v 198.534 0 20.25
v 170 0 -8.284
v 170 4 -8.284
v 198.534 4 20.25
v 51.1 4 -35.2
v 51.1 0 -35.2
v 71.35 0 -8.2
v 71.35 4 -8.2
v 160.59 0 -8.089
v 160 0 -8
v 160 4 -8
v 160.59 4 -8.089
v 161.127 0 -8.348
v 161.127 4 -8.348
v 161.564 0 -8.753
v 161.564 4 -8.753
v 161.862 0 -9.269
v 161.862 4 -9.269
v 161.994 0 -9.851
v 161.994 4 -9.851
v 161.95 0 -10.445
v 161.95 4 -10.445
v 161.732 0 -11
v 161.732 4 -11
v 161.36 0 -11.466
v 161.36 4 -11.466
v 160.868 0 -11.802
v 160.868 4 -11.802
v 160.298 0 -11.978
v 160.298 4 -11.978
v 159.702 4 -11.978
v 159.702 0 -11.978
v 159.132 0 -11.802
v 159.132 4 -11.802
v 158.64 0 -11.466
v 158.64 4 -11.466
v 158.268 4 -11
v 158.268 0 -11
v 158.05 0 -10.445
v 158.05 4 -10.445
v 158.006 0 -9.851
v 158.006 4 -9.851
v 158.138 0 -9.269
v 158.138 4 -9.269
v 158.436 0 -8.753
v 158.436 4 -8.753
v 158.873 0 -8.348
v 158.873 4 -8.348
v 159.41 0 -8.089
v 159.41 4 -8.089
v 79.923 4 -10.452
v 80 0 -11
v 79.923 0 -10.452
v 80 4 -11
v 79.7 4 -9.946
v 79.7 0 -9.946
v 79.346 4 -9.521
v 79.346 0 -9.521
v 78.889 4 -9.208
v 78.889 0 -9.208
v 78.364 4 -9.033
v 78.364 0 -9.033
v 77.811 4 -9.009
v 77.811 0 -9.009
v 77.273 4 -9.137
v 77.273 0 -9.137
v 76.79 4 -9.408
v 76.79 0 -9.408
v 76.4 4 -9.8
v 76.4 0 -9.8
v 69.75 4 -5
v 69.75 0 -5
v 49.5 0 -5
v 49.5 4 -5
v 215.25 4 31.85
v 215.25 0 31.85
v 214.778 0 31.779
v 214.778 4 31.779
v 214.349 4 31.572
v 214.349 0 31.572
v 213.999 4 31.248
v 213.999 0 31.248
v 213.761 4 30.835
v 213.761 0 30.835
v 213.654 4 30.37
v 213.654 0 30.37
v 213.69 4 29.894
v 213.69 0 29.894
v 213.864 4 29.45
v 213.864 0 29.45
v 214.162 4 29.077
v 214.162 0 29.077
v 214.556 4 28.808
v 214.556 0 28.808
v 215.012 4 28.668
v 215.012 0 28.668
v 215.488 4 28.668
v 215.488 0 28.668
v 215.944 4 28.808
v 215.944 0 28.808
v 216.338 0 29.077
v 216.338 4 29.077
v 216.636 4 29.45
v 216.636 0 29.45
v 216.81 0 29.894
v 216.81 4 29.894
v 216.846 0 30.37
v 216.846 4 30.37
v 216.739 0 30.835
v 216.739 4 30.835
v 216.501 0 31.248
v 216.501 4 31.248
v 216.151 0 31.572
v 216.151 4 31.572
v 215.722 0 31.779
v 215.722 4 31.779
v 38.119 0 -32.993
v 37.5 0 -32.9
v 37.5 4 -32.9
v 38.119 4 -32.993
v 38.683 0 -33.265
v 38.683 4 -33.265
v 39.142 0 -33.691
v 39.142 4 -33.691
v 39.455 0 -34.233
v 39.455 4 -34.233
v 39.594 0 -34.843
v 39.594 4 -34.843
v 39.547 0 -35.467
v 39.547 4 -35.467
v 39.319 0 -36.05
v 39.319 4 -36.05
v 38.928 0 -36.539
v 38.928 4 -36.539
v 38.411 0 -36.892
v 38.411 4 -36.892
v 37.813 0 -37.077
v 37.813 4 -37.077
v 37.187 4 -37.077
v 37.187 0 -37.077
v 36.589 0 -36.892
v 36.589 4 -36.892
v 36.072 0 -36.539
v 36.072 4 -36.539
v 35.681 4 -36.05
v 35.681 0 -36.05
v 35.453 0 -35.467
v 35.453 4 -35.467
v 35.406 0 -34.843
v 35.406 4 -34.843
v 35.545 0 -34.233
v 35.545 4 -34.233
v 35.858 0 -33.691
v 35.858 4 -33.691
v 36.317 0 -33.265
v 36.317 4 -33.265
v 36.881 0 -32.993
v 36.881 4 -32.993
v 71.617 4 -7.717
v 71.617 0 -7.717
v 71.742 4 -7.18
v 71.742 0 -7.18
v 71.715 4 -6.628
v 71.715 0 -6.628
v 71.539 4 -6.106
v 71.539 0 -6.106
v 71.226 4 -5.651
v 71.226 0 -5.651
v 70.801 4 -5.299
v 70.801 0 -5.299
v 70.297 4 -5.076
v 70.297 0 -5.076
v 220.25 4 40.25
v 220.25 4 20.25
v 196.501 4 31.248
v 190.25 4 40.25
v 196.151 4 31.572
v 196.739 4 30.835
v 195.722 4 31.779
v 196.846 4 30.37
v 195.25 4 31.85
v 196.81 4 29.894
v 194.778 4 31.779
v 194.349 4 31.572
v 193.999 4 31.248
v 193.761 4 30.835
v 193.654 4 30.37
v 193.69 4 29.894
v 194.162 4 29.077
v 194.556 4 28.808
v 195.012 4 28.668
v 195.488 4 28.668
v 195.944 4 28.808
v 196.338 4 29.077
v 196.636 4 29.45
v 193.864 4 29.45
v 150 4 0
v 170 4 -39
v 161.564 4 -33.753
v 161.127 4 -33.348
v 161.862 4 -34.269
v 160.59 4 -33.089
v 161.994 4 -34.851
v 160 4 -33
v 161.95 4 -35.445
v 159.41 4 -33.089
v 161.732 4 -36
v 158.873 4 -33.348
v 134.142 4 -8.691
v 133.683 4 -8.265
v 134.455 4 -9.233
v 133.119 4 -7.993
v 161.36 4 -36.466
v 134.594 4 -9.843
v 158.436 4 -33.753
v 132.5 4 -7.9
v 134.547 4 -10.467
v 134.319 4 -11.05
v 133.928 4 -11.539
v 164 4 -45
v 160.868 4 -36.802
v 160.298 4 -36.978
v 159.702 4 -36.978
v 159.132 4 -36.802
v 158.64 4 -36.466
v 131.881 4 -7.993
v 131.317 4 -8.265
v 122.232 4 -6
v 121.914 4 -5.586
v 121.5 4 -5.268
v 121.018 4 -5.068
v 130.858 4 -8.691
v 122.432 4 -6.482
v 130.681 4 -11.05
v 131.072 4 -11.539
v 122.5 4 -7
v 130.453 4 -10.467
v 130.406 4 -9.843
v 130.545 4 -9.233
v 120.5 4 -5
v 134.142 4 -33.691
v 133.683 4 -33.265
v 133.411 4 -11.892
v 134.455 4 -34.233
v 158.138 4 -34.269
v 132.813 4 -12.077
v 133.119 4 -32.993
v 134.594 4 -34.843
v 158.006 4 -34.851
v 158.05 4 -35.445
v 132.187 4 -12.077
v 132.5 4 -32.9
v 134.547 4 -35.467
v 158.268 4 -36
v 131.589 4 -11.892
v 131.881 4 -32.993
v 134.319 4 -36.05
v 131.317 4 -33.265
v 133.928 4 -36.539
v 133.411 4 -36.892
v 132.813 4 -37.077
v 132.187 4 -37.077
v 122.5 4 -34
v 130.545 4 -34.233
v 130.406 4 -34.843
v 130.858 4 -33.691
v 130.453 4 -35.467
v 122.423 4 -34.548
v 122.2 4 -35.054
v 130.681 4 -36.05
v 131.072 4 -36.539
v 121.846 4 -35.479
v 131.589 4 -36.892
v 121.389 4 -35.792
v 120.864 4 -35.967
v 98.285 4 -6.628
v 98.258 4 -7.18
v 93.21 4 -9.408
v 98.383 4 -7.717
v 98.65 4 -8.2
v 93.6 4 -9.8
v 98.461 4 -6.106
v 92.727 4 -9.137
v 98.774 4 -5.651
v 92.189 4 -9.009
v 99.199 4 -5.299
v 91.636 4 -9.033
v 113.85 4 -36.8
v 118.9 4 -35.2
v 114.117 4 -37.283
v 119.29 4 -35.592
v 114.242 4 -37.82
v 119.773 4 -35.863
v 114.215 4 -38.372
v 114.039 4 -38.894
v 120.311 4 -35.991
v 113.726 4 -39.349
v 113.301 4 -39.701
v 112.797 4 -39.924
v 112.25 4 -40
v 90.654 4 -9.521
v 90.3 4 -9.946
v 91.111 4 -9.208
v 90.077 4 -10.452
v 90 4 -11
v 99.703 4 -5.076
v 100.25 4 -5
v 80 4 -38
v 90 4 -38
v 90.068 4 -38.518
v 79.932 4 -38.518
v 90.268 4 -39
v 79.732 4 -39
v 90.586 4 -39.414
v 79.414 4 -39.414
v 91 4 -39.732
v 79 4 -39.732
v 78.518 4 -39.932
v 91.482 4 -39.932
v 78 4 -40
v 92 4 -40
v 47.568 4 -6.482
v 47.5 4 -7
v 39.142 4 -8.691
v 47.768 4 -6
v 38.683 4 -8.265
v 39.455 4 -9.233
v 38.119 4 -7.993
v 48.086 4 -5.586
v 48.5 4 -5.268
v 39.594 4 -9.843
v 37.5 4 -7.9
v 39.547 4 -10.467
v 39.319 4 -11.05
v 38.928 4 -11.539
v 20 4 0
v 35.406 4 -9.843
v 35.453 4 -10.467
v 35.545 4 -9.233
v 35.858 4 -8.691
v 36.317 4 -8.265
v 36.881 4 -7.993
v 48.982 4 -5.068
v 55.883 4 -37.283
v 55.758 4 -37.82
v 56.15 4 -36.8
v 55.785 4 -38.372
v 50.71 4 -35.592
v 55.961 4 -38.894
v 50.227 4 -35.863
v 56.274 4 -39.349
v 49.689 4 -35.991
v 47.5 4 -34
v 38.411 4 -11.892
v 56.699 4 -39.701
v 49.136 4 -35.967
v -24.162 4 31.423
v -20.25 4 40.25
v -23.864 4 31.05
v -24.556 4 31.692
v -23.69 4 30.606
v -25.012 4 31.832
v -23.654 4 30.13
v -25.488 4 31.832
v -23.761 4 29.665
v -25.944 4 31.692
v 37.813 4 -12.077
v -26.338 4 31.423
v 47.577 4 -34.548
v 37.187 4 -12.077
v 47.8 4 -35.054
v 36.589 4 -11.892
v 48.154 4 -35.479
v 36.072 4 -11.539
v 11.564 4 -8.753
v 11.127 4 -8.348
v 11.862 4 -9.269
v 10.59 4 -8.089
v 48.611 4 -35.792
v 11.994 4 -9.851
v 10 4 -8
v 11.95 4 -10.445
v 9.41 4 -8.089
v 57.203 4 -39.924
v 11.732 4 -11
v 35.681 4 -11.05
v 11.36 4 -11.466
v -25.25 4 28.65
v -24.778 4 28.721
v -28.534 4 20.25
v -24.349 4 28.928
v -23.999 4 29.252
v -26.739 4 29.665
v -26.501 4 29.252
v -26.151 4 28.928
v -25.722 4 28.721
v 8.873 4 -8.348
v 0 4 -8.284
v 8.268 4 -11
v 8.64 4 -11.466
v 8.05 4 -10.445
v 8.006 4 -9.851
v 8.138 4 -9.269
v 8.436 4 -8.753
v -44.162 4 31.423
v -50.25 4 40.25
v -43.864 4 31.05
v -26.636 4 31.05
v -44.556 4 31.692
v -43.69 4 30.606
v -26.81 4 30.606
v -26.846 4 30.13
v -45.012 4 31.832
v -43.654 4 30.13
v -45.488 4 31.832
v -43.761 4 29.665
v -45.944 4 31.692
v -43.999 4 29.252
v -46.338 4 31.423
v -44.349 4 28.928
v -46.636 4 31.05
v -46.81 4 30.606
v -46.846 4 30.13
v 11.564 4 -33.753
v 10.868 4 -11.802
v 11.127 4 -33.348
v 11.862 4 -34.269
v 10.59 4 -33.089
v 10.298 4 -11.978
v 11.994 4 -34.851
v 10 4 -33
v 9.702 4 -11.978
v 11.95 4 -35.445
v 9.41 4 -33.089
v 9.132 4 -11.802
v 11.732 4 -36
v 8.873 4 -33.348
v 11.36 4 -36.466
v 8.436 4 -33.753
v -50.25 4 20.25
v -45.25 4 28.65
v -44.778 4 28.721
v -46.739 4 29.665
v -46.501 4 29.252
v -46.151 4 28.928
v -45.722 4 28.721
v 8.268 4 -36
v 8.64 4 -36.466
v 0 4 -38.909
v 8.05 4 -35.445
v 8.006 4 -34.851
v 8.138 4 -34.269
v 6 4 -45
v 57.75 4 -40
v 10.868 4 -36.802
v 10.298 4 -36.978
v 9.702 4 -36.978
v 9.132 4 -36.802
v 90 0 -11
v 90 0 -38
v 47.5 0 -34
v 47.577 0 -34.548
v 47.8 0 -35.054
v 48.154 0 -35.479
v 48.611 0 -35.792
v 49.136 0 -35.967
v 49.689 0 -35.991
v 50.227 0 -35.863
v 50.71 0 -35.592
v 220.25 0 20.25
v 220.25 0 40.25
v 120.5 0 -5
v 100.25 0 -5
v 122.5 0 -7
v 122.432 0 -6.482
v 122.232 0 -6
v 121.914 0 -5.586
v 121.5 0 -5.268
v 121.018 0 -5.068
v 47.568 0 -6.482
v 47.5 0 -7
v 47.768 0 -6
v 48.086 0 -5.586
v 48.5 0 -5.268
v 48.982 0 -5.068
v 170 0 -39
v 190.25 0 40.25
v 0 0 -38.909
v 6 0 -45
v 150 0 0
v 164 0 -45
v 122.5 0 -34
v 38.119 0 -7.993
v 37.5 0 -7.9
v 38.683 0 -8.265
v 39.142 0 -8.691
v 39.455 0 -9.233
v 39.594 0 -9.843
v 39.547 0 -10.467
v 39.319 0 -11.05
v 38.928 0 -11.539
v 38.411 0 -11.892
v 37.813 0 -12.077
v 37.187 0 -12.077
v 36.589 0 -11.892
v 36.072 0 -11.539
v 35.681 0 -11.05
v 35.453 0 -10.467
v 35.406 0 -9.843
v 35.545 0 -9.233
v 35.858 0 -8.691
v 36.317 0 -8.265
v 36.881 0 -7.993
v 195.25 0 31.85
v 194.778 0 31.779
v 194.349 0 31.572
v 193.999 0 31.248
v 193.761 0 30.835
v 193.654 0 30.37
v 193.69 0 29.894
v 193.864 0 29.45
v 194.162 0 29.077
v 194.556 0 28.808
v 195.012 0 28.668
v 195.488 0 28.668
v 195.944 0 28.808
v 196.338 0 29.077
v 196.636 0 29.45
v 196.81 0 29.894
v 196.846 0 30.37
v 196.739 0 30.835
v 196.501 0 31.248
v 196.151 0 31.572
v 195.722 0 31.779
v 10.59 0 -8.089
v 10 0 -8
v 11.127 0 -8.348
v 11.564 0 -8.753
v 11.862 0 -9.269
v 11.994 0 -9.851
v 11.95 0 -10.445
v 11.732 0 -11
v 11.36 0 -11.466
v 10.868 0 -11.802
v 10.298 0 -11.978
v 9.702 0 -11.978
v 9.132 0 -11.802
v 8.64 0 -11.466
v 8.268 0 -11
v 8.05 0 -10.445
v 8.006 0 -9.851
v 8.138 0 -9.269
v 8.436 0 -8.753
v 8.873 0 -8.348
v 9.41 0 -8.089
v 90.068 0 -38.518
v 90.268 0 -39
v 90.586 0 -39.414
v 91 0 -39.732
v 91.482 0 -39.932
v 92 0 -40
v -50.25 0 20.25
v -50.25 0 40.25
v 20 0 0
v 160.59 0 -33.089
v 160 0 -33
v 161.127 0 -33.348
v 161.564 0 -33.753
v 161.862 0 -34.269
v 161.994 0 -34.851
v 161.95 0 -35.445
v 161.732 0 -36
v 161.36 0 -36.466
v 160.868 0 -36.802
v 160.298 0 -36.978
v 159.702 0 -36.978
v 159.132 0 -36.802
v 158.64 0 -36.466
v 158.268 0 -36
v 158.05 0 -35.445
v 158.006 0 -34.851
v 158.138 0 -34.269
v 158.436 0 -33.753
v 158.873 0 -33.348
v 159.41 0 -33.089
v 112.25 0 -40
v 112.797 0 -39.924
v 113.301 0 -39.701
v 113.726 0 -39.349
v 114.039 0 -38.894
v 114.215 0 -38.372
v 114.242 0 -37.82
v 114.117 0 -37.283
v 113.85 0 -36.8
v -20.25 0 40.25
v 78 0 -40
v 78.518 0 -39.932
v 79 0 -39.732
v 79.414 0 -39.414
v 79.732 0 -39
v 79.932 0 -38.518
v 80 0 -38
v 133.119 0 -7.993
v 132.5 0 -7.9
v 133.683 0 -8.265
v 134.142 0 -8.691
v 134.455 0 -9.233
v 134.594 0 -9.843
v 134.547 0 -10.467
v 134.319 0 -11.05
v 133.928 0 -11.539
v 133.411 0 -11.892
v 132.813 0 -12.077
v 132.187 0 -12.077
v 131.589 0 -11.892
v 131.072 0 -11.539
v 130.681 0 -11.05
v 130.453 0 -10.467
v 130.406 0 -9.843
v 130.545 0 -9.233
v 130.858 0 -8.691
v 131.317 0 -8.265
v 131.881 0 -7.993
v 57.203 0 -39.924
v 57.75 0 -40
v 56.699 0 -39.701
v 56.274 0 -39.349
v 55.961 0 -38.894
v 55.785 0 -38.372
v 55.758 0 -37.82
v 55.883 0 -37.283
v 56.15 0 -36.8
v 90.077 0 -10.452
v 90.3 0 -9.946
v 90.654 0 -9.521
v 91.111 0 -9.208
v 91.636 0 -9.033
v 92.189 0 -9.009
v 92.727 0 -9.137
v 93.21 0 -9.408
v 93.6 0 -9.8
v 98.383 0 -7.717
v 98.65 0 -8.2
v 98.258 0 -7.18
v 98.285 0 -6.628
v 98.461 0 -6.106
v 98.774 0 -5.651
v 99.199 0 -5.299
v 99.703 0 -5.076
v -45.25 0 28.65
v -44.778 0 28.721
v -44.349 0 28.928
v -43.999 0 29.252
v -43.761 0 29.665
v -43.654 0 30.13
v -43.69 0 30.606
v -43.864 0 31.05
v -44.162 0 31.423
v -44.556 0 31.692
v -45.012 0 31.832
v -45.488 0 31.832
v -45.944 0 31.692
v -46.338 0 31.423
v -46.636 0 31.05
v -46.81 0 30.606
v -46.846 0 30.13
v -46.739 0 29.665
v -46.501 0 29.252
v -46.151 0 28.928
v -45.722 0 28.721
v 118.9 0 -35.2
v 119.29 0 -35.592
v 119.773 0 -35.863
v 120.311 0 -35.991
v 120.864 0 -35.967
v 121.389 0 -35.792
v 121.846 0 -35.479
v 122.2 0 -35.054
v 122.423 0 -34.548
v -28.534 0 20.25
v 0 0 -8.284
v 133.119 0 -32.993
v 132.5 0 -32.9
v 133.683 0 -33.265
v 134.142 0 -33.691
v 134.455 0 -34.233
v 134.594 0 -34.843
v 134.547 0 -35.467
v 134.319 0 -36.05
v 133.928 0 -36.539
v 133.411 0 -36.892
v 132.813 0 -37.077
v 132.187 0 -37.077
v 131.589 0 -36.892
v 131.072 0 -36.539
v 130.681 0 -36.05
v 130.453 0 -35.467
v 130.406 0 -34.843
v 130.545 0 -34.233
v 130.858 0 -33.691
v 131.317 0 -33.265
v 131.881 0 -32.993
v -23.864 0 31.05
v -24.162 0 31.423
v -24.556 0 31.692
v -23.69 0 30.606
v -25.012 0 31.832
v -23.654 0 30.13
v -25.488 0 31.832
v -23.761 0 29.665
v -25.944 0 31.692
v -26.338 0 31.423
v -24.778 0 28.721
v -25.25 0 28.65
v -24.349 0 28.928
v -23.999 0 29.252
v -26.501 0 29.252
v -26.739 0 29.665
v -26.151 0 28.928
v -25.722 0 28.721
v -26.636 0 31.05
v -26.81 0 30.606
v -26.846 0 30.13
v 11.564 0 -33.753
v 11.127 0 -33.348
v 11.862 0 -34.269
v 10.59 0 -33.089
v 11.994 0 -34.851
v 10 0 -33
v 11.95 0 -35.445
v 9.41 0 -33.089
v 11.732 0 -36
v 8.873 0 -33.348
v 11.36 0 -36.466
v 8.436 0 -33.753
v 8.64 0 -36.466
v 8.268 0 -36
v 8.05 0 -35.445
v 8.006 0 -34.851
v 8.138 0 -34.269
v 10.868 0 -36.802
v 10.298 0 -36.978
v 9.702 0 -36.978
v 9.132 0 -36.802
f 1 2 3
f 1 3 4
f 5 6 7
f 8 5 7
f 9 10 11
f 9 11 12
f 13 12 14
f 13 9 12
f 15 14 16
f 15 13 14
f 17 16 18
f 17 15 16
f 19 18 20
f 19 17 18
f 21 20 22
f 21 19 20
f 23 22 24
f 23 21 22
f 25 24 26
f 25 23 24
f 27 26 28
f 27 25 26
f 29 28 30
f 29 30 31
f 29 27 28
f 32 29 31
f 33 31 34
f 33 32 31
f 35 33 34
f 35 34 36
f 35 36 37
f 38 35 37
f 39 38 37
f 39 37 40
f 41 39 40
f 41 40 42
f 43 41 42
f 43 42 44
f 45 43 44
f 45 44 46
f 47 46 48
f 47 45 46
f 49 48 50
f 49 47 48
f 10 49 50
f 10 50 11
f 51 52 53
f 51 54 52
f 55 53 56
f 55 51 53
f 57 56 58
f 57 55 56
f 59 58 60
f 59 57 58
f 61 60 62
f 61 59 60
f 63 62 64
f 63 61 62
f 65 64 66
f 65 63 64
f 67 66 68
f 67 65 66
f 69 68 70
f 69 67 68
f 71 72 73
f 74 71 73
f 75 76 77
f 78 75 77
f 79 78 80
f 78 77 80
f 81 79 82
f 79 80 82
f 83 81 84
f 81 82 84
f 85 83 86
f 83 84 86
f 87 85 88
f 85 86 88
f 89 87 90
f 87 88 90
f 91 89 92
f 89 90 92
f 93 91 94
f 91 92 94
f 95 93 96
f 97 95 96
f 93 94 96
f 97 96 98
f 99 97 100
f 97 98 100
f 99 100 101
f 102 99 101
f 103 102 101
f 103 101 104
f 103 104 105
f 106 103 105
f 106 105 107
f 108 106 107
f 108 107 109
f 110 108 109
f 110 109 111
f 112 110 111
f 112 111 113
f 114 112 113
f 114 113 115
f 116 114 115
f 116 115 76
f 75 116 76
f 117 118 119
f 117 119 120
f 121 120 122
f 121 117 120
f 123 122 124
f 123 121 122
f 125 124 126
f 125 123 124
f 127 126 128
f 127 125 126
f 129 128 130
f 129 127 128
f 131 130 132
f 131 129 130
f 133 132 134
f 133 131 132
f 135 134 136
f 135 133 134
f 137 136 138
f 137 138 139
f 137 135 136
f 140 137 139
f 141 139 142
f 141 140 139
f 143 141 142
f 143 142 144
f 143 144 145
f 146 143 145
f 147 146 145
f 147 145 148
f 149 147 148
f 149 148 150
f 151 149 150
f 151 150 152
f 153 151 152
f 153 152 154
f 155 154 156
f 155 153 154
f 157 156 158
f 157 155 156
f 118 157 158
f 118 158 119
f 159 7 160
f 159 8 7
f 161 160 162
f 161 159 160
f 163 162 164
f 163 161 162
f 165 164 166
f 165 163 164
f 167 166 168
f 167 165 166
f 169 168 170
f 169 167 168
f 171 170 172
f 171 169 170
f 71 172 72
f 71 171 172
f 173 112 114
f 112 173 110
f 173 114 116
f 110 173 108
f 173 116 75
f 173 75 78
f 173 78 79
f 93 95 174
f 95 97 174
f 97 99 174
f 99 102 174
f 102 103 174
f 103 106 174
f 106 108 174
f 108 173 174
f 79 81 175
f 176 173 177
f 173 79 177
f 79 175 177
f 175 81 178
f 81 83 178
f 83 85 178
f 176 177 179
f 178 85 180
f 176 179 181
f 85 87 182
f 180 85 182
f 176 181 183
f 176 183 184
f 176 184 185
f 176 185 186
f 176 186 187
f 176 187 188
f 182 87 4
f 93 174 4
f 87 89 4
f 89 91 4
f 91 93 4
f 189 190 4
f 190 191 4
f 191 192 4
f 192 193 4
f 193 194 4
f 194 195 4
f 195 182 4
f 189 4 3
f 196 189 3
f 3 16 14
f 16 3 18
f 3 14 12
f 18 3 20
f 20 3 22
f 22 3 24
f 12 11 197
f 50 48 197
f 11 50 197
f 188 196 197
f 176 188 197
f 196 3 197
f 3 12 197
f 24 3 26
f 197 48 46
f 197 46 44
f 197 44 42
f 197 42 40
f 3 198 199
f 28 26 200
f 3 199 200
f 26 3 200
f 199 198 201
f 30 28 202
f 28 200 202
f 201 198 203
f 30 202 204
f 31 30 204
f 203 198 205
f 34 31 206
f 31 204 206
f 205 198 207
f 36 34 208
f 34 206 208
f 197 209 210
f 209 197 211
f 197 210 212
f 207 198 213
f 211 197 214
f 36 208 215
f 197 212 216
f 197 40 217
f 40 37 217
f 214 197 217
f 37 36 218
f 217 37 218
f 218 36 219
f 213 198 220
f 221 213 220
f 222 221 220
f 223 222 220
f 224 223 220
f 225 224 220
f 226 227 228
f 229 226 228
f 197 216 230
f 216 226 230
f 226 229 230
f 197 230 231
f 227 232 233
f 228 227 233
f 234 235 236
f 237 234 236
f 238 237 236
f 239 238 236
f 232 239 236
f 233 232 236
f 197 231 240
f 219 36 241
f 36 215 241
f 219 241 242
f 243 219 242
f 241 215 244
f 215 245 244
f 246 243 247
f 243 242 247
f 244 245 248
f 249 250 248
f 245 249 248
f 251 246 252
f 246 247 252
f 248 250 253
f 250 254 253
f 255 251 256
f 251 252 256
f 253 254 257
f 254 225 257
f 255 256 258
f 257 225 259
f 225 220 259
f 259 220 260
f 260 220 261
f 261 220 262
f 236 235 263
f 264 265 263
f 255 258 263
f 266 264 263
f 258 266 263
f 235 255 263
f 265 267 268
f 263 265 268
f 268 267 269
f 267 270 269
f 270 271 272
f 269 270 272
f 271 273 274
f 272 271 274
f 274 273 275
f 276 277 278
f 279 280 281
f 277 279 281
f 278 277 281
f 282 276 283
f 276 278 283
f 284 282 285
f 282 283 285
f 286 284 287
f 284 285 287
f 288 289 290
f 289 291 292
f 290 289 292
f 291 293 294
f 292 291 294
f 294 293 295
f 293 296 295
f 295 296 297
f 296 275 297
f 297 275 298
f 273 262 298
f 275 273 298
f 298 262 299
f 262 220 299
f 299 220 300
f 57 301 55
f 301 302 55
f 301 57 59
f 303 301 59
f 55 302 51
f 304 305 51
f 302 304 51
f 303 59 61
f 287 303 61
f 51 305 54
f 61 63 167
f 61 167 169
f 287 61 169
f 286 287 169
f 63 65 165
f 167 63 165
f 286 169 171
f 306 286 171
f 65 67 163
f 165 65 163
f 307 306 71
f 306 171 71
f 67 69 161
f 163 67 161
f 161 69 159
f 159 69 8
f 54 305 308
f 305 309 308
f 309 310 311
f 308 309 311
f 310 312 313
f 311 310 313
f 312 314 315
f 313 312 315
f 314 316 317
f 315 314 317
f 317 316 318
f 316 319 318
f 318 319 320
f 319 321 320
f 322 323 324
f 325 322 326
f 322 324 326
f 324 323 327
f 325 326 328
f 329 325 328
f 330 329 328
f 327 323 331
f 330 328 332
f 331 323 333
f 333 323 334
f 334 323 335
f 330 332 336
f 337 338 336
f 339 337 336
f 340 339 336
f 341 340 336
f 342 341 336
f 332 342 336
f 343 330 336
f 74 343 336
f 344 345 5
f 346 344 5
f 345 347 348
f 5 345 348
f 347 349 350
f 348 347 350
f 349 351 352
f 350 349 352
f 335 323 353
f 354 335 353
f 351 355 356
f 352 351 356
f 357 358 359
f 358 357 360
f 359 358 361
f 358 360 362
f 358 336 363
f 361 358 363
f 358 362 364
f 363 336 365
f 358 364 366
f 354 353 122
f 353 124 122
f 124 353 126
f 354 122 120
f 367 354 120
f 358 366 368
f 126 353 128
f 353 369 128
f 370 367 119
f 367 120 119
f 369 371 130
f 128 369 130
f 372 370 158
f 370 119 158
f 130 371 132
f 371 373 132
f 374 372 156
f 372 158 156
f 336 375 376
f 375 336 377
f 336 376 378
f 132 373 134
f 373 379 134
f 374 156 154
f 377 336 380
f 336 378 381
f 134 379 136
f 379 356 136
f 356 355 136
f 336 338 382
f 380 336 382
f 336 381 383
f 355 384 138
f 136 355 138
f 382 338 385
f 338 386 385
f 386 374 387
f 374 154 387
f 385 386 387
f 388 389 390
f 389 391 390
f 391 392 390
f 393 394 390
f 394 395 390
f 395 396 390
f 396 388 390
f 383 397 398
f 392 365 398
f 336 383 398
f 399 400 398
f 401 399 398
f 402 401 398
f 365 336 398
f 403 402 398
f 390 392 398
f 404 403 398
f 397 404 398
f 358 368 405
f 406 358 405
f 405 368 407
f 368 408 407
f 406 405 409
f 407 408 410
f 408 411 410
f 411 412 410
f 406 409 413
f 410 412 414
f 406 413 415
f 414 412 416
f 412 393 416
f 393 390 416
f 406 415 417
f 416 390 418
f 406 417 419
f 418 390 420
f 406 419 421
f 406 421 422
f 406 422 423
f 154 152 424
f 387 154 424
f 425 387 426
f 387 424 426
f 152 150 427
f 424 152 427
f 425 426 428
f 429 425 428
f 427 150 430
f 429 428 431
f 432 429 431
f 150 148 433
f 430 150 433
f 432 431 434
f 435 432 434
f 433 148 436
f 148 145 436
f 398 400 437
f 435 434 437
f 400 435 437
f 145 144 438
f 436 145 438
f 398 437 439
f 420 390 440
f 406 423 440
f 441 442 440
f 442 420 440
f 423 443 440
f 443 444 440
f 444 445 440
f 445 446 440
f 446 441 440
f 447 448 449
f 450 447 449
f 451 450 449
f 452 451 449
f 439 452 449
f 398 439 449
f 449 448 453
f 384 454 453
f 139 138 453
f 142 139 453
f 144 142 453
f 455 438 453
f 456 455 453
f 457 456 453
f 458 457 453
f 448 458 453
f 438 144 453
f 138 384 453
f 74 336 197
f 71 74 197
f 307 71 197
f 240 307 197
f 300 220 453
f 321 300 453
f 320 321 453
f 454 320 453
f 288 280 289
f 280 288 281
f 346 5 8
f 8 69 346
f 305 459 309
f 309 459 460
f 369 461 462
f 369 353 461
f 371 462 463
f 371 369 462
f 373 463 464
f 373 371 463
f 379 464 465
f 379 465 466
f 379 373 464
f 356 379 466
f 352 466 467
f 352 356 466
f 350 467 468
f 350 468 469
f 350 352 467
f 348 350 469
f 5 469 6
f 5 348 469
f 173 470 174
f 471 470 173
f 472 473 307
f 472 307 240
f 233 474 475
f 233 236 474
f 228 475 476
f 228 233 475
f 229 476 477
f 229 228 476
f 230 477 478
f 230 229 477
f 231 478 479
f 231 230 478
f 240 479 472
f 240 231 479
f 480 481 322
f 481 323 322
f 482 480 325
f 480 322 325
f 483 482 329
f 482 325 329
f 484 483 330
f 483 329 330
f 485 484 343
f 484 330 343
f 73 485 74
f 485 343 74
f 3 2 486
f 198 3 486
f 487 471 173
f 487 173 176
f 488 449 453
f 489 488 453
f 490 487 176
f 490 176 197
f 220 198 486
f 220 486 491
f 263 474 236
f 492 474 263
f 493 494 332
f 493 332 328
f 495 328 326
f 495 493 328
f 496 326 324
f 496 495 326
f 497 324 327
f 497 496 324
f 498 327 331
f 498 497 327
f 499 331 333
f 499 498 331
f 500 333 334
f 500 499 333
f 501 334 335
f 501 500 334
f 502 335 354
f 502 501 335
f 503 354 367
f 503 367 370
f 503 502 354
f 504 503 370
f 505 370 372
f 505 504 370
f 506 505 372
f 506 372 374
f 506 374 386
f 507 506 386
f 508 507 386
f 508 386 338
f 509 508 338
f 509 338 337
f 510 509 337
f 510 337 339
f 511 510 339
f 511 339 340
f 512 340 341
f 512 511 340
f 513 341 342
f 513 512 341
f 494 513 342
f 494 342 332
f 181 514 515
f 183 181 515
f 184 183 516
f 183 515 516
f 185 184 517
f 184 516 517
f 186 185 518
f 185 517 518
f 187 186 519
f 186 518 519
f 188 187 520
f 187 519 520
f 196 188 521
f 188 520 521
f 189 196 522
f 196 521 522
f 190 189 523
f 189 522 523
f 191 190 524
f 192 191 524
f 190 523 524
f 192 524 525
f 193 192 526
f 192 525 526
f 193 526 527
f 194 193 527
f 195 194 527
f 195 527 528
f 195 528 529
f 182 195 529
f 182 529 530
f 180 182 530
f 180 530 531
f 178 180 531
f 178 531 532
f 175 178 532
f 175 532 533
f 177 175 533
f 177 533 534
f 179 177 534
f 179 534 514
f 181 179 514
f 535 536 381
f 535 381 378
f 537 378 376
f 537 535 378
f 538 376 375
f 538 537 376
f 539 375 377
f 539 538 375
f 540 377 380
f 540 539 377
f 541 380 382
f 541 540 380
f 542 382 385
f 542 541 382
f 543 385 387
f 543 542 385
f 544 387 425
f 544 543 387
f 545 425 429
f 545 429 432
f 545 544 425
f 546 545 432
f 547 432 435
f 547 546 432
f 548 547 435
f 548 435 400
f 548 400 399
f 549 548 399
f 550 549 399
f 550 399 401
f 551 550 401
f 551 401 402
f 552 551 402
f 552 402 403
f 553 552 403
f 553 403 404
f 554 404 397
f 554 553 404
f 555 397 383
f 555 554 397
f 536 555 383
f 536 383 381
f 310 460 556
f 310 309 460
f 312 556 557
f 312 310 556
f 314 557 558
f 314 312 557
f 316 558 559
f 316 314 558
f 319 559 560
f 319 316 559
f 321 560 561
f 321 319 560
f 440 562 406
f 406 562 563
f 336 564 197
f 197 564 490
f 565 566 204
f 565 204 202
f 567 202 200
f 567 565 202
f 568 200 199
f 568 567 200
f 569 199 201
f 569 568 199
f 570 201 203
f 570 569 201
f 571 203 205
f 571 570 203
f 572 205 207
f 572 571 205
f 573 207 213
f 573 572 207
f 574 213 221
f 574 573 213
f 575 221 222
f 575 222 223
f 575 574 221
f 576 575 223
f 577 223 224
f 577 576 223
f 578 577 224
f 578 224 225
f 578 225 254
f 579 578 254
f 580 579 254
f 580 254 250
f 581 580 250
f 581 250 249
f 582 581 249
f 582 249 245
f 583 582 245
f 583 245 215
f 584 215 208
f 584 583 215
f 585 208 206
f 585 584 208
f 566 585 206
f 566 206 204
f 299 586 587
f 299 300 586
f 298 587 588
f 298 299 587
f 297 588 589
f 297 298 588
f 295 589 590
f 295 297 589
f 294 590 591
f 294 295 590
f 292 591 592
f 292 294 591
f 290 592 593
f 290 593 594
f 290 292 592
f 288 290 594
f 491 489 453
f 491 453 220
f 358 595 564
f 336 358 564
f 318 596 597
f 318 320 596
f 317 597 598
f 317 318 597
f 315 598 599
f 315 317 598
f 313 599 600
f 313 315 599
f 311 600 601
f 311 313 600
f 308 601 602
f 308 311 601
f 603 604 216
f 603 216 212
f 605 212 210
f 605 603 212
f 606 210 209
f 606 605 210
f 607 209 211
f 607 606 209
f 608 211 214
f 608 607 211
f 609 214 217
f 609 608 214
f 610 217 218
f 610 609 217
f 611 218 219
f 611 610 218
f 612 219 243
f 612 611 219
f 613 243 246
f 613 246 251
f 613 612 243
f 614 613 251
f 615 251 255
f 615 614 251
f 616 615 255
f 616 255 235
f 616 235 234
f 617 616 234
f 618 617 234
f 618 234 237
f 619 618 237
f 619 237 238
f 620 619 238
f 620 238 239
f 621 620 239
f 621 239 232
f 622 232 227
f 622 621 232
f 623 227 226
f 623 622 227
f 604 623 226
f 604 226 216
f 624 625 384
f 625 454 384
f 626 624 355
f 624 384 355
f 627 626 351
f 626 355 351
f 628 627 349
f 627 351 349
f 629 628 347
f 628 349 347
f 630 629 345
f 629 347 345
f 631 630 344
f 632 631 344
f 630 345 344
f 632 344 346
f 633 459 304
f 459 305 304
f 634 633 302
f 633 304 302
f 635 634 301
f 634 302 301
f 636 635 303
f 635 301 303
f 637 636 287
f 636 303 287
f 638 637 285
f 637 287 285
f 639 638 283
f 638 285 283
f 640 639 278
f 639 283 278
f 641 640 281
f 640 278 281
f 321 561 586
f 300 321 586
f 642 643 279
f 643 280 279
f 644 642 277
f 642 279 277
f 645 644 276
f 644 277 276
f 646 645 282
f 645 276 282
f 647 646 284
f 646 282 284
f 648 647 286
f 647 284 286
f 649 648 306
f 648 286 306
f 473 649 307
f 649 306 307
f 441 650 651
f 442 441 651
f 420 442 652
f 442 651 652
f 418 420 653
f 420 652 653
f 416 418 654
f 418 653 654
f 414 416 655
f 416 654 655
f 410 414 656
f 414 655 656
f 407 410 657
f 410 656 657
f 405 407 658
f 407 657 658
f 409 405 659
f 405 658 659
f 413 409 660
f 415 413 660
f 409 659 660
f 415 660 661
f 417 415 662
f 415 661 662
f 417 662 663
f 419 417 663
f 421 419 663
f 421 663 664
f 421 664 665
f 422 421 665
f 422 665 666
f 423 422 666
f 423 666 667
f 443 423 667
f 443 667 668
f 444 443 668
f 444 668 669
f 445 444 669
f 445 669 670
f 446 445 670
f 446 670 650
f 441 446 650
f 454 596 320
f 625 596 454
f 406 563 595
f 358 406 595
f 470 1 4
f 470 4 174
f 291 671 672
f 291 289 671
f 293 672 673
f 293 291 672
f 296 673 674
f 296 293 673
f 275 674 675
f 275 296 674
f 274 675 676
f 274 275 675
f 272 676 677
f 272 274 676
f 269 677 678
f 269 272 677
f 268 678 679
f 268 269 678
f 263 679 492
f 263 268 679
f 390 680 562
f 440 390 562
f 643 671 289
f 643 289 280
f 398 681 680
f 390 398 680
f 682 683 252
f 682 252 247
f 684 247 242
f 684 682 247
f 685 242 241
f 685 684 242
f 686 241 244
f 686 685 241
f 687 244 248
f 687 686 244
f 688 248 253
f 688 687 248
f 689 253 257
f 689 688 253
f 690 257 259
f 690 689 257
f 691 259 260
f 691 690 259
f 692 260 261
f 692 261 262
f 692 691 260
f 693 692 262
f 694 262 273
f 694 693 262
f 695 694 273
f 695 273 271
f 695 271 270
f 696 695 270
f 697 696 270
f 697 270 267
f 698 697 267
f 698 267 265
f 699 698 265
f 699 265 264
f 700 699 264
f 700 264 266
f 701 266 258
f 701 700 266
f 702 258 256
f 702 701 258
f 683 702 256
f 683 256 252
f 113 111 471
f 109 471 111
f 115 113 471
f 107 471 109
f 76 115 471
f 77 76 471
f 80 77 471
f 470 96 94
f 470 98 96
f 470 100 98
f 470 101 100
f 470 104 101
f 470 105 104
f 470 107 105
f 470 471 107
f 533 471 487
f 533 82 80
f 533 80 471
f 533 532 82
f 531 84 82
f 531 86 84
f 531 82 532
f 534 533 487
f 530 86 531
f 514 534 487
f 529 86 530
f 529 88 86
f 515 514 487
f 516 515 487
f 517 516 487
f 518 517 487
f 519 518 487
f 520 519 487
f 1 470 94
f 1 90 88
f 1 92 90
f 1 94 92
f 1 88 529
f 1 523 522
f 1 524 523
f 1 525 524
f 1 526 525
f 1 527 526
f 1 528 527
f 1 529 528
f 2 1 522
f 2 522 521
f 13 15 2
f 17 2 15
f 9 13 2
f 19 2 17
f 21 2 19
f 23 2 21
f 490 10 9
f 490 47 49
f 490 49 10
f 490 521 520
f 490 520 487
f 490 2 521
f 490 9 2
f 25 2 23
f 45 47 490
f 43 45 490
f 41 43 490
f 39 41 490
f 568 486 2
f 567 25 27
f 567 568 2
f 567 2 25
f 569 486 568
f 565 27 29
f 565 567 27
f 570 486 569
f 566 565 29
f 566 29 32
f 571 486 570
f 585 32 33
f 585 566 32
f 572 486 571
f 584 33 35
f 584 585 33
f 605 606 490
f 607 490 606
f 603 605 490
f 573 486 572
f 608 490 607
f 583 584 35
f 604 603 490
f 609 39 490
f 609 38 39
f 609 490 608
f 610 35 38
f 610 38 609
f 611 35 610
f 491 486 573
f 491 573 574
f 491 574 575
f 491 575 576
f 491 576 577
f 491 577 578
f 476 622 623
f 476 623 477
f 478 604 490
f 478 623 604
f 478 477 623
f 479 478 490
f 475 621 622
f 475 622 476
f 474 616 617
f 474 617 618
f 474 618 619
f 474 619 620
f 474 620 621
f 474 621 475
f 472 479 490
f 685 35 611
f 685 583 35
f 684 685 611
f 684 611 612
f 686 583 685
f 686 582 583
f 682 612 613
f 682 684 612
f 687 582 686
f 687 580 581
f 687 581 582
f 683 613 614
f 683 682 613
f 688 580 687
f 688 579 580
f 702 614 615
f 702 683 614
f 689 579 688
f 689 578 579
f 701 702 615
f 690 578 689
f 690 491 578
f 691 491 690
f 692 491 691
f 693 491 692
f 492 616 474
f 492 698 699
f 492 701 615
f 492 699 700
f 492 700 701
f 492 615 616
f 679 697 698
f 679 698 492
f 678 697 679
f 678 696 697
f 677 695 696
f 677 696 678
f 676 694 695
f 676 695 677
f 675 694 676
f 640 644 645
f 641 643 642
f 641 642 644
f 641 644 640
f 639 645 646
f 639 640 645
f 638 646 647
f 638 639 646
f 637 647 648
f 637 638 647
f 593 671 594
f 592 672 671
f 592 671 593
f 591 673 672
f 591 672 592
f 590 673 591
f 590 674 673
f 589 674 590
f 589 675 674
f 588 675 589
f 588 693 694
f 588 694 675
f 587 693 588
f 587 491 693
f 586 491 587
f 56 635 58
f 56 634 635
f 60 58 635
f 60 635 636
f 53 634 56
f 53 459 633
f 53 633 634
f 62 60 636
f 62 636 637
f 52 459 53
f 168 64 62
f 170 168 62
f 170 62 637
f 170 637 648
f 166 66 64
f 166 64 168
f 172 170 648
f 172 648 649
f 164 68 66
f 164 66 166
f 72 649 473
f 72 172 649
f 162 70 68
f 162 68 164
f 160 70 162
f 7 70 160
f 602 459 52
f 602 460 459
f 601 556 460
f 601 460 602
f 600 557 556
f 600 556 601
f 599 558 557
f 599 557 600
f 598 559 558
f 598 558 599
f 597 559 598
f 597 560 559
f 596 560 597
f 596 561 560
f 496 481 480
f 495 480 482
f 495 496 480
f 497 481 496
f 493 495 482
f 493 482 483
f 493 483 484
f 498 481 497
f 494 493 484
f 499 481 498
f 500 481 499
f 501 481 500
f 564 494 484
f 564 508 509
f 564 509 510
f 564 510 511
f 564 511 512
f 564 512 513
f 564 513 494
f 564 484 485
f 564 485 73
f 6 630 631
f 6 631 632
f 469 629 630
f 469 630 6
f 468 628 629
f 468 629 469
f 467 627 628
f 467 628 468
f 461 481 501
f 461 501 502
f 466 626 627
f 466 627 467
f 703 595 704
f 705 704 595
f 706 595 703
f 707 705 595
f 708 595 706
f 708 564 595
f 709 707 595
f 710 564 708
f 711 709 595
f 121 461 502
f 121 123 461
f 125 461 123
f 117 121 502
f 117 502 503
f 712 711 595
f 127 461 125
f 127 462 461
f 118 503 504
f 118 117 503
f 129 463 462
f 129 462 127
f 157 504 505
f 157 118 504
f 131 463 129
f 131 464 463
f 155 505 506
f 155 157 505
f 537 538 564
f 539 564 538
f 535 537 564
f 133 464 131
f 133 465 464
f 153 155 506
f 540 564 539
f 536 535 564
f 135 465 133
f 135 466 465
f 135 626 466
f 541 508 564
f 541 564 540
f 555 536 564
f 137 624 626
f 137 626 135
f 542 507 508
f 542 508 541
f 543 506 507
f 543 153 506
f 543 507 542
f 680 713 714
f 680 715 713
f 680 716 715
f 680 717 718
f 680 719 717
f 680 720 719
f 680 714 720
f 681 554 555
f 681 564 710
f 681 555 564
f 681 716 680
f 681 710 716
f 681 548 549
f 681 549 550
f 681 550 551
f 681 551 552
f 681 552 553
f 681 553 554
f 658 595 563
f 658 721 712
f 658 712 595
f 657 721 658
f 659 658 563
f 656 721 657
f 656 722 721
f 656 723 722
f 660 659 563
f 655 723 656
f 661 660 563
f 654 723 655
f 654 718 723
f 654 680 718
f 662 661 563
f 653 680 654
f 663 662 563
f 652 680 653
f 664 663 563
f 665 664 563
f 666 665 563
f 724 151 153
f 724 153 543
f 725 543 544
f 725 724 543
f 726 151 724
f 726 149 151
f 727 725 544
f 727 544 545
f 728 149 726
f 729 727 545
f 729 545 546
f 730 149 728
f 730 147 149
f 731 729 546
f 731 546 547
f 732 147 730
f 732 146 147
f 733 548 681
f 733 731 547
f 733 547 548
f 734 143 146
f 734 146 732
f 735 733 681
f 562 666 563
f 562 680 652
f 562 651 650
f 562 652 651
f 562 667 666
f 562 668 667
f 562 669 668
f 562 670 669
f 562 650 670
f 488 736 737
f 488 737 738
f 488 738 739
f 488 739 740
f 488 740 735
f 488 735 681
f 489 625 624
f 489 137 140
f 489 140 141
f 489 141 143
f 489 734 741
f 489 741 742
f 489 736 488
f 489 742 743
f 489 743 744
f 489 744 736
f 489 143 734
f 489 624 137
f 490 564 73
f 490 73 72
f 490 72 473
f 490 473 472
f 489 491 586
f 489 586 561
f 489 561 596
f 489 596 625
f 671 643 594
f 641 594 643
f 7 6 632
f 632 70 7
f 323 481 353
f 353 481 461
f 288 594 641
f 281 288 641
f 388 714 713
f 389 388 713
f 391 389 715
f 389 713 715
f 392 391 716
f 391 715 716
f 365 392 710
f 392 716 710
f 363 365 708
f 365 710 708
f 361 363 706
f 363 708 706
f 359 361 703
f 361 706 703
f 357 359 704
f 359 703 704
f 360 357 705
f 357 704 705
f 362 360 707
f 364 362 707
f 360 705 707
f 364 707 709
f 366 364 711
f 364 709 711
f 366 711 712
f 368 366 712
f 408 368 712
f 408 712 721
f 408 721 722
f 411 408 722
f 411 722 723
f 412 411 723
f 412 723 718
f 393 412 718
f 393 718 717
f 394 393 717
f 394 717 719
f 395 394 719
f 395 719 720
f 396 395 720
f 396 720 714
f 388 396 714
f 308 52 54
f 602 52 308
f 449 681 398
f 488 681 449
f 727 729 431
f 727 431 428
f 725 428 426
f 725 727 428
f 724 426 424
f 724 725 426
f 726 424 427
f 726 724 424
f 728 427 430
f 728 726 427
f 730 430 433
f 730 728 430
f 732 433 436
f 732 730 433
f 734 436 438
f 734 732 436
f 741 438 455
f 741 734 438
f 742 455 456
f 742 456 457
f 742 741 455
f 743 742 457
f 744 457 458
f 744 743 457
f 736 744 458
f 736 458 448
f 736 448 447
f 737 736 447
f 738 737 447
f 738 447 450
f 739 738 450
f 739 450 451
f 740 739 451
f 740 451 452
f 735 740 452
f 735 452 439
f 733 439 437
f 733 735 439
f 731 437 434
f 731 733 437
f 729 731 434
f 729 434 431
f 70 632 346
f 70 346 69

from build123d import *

# Parameters (mm, degrees)
SKETCH_1_W          = 170
SKETCH_1_H          = 45
SKETCH_1_R          = 2
SKETCH_1_R_2        = 2.1
EXTRUDE_1_DEPTH     = 4
EXTRUDE_2_DEPTH     = 4
CUT_EXTRUDE_1_DEPTH = 4
CUT_EXTRUDE_2_DEPTH = 4
FILLET_1_R          = 2
SKETCH_6_R          = 1.6
CUT_EXTRUDE_3_DEPTH = 50


with BuildPart() as part:
    # 草图1 → 凸台-拉伸1 (new body)
    with BuildSketch(Plane(origin=(0, 0, 0), x_dir=(1, 0, 0), z_dir=(0, 1, 0))):
        with Locations((85, 22.5)):
            Rectangle(SKETCH_1_W, SKETCH_1_H)
        with Locations(Location((10, 35, 0), (0, 0, 270))):
            Circle(SKETCH_1_R, mode=Mode.SUBTRACT)
        with Locations(Location((10, 10, 0), (0, 0, 270))):
            Circle(SKETCH_1_R, mode=Mode.SUBTRACT)
        with Locations(Location((160, 10, 0), (0, 0, 270))):
            Circle(SKETCH_1_R, mode=Mode.SUBTRACT)
        with Locations(Location((160, 35, 0), (0, 0, 270))):
            Circle(SKETCH_1_R, mode=Mode.SUBTRACT)
        with Locations(Location((37.5, 35, 0), (0, 0, 270))):
            Circle(SKETCH_1_R_2, mode=Mode.SUBTRACT)
        with Locations(Location((37.5, 10, 0), (0, 0, 270))):
            Circle(SKETCH_1_R_2, mode=Mode.SUBTRACT)
        with Locations(Location((132.5, 10, 0), (0, 0, 270))):
            Circle(SKETCH_1_R_2, mode=Mode.SUBTRACT)
        with Locations(Location((132.5, 35, 0), (0, 0, 270))):
            Circle(SKETCH_1_R_2, mode=Mode.SUBTRACT)
    extrude(amount=EXTRUDE_1_DEPTH)

    # 草图2 → 凸台-拉伸2 (add)
    with BuildSketch(Plane(origin=(0, 0, 0), x_dir=(1, 0, 0), z_dir=(0, 1, 0))):
        Polygon((170, 8.284271247), (198.534271247, -20.25), (220.25, -20.25), (220.25, -40.25), (190.25, -40.25), (150, 0), (170, 0), align=None)
        Polygon((-50.25, -40.25), (-20.25, -40.25), (20, 0), (0, 0), (0, 8.284271247), (-28.534271247, -20.25), (-50.25, -20.25), align=None)
    extrude(amount=EXTRUDE_2_DEPTH)

    # 草图4 → 切除-拉伸1 (cut)
    with BuildSketch(Plane(origin=(0, 4, 0), x_dir=(1, 0, 0), z_dir=(0, 1, 0))):
        Polygon((0, 38.909451479), (6, 45), (0, 45), align=None)
        Polygon((170, 39), (164, 45), (170, 45), align=None)
    extrude(amount=-CUT_EXTRUDE_1_DEPTH, mode=Mode.SUBTRACT)

    # 草图5 → 切除-拉伸2 (cut)
    with BuildSketch(Plane.XZ):
        Polygon((47.5, -5), (47.5, -40), (73.75, -5), align=None)
        Polygon((53.75, -40), (80, -5), (80, -40), align=None)
        Polygon((90, -5), (90, -40), (116.25, -40), align=None)
        Polygon((96.25, -5), (122.5, -5), (122.5, -40), align=None)
    extrude(amount=-CUT_EXTRUDE_2_DEPTH, mode=Mode.SUBTRACT)

    # 圆角1
    fillet_1_edges = [part.edges().sort_by_distance(p)[0] for p in [
        (80, 2, -5),
        (53.75, 2, -40),
        (80, 2, -40),
        (90, 2, -40),
        (116.25, 2, -40),
        (90, 2, -5),
        (122.5, 2, -5),
        (96.25, 2, -5),
        (122.5, 2, -40),
        (47.5, 2, -40),
        (73.75, 2, -5),
        (47.5, 2, -5),
    ]]
    fillet(fillet_1_edges, radius=FILLET_1_R)

    # 草图6 → 切除-拉伸3 (cut)
    with BuildSketch(Plane.XZ):
        with Locations(Location((-45.25, 30.25, 0), (0, 0, 270))):
            Circle(SKETCH_6_R)
        with Locations(Location((-25.25, 30.25, 0), (0, 0, 270))):
            Circle(SKETCH_6_R)
        with Locations(Location((195.25, 30.25, 0), (0, 0, 90))):
            Circle(SKETCH_6_R)
        with Locations(Location((215.25, 30.25, 0), (0, 0, 90))):
            Circle(SKETCH_6_R)
    extrude(amount=-CUT_EXTRUDE_3_DEPTH, mode=Mode.SUBTRACT)


solid = part.part
